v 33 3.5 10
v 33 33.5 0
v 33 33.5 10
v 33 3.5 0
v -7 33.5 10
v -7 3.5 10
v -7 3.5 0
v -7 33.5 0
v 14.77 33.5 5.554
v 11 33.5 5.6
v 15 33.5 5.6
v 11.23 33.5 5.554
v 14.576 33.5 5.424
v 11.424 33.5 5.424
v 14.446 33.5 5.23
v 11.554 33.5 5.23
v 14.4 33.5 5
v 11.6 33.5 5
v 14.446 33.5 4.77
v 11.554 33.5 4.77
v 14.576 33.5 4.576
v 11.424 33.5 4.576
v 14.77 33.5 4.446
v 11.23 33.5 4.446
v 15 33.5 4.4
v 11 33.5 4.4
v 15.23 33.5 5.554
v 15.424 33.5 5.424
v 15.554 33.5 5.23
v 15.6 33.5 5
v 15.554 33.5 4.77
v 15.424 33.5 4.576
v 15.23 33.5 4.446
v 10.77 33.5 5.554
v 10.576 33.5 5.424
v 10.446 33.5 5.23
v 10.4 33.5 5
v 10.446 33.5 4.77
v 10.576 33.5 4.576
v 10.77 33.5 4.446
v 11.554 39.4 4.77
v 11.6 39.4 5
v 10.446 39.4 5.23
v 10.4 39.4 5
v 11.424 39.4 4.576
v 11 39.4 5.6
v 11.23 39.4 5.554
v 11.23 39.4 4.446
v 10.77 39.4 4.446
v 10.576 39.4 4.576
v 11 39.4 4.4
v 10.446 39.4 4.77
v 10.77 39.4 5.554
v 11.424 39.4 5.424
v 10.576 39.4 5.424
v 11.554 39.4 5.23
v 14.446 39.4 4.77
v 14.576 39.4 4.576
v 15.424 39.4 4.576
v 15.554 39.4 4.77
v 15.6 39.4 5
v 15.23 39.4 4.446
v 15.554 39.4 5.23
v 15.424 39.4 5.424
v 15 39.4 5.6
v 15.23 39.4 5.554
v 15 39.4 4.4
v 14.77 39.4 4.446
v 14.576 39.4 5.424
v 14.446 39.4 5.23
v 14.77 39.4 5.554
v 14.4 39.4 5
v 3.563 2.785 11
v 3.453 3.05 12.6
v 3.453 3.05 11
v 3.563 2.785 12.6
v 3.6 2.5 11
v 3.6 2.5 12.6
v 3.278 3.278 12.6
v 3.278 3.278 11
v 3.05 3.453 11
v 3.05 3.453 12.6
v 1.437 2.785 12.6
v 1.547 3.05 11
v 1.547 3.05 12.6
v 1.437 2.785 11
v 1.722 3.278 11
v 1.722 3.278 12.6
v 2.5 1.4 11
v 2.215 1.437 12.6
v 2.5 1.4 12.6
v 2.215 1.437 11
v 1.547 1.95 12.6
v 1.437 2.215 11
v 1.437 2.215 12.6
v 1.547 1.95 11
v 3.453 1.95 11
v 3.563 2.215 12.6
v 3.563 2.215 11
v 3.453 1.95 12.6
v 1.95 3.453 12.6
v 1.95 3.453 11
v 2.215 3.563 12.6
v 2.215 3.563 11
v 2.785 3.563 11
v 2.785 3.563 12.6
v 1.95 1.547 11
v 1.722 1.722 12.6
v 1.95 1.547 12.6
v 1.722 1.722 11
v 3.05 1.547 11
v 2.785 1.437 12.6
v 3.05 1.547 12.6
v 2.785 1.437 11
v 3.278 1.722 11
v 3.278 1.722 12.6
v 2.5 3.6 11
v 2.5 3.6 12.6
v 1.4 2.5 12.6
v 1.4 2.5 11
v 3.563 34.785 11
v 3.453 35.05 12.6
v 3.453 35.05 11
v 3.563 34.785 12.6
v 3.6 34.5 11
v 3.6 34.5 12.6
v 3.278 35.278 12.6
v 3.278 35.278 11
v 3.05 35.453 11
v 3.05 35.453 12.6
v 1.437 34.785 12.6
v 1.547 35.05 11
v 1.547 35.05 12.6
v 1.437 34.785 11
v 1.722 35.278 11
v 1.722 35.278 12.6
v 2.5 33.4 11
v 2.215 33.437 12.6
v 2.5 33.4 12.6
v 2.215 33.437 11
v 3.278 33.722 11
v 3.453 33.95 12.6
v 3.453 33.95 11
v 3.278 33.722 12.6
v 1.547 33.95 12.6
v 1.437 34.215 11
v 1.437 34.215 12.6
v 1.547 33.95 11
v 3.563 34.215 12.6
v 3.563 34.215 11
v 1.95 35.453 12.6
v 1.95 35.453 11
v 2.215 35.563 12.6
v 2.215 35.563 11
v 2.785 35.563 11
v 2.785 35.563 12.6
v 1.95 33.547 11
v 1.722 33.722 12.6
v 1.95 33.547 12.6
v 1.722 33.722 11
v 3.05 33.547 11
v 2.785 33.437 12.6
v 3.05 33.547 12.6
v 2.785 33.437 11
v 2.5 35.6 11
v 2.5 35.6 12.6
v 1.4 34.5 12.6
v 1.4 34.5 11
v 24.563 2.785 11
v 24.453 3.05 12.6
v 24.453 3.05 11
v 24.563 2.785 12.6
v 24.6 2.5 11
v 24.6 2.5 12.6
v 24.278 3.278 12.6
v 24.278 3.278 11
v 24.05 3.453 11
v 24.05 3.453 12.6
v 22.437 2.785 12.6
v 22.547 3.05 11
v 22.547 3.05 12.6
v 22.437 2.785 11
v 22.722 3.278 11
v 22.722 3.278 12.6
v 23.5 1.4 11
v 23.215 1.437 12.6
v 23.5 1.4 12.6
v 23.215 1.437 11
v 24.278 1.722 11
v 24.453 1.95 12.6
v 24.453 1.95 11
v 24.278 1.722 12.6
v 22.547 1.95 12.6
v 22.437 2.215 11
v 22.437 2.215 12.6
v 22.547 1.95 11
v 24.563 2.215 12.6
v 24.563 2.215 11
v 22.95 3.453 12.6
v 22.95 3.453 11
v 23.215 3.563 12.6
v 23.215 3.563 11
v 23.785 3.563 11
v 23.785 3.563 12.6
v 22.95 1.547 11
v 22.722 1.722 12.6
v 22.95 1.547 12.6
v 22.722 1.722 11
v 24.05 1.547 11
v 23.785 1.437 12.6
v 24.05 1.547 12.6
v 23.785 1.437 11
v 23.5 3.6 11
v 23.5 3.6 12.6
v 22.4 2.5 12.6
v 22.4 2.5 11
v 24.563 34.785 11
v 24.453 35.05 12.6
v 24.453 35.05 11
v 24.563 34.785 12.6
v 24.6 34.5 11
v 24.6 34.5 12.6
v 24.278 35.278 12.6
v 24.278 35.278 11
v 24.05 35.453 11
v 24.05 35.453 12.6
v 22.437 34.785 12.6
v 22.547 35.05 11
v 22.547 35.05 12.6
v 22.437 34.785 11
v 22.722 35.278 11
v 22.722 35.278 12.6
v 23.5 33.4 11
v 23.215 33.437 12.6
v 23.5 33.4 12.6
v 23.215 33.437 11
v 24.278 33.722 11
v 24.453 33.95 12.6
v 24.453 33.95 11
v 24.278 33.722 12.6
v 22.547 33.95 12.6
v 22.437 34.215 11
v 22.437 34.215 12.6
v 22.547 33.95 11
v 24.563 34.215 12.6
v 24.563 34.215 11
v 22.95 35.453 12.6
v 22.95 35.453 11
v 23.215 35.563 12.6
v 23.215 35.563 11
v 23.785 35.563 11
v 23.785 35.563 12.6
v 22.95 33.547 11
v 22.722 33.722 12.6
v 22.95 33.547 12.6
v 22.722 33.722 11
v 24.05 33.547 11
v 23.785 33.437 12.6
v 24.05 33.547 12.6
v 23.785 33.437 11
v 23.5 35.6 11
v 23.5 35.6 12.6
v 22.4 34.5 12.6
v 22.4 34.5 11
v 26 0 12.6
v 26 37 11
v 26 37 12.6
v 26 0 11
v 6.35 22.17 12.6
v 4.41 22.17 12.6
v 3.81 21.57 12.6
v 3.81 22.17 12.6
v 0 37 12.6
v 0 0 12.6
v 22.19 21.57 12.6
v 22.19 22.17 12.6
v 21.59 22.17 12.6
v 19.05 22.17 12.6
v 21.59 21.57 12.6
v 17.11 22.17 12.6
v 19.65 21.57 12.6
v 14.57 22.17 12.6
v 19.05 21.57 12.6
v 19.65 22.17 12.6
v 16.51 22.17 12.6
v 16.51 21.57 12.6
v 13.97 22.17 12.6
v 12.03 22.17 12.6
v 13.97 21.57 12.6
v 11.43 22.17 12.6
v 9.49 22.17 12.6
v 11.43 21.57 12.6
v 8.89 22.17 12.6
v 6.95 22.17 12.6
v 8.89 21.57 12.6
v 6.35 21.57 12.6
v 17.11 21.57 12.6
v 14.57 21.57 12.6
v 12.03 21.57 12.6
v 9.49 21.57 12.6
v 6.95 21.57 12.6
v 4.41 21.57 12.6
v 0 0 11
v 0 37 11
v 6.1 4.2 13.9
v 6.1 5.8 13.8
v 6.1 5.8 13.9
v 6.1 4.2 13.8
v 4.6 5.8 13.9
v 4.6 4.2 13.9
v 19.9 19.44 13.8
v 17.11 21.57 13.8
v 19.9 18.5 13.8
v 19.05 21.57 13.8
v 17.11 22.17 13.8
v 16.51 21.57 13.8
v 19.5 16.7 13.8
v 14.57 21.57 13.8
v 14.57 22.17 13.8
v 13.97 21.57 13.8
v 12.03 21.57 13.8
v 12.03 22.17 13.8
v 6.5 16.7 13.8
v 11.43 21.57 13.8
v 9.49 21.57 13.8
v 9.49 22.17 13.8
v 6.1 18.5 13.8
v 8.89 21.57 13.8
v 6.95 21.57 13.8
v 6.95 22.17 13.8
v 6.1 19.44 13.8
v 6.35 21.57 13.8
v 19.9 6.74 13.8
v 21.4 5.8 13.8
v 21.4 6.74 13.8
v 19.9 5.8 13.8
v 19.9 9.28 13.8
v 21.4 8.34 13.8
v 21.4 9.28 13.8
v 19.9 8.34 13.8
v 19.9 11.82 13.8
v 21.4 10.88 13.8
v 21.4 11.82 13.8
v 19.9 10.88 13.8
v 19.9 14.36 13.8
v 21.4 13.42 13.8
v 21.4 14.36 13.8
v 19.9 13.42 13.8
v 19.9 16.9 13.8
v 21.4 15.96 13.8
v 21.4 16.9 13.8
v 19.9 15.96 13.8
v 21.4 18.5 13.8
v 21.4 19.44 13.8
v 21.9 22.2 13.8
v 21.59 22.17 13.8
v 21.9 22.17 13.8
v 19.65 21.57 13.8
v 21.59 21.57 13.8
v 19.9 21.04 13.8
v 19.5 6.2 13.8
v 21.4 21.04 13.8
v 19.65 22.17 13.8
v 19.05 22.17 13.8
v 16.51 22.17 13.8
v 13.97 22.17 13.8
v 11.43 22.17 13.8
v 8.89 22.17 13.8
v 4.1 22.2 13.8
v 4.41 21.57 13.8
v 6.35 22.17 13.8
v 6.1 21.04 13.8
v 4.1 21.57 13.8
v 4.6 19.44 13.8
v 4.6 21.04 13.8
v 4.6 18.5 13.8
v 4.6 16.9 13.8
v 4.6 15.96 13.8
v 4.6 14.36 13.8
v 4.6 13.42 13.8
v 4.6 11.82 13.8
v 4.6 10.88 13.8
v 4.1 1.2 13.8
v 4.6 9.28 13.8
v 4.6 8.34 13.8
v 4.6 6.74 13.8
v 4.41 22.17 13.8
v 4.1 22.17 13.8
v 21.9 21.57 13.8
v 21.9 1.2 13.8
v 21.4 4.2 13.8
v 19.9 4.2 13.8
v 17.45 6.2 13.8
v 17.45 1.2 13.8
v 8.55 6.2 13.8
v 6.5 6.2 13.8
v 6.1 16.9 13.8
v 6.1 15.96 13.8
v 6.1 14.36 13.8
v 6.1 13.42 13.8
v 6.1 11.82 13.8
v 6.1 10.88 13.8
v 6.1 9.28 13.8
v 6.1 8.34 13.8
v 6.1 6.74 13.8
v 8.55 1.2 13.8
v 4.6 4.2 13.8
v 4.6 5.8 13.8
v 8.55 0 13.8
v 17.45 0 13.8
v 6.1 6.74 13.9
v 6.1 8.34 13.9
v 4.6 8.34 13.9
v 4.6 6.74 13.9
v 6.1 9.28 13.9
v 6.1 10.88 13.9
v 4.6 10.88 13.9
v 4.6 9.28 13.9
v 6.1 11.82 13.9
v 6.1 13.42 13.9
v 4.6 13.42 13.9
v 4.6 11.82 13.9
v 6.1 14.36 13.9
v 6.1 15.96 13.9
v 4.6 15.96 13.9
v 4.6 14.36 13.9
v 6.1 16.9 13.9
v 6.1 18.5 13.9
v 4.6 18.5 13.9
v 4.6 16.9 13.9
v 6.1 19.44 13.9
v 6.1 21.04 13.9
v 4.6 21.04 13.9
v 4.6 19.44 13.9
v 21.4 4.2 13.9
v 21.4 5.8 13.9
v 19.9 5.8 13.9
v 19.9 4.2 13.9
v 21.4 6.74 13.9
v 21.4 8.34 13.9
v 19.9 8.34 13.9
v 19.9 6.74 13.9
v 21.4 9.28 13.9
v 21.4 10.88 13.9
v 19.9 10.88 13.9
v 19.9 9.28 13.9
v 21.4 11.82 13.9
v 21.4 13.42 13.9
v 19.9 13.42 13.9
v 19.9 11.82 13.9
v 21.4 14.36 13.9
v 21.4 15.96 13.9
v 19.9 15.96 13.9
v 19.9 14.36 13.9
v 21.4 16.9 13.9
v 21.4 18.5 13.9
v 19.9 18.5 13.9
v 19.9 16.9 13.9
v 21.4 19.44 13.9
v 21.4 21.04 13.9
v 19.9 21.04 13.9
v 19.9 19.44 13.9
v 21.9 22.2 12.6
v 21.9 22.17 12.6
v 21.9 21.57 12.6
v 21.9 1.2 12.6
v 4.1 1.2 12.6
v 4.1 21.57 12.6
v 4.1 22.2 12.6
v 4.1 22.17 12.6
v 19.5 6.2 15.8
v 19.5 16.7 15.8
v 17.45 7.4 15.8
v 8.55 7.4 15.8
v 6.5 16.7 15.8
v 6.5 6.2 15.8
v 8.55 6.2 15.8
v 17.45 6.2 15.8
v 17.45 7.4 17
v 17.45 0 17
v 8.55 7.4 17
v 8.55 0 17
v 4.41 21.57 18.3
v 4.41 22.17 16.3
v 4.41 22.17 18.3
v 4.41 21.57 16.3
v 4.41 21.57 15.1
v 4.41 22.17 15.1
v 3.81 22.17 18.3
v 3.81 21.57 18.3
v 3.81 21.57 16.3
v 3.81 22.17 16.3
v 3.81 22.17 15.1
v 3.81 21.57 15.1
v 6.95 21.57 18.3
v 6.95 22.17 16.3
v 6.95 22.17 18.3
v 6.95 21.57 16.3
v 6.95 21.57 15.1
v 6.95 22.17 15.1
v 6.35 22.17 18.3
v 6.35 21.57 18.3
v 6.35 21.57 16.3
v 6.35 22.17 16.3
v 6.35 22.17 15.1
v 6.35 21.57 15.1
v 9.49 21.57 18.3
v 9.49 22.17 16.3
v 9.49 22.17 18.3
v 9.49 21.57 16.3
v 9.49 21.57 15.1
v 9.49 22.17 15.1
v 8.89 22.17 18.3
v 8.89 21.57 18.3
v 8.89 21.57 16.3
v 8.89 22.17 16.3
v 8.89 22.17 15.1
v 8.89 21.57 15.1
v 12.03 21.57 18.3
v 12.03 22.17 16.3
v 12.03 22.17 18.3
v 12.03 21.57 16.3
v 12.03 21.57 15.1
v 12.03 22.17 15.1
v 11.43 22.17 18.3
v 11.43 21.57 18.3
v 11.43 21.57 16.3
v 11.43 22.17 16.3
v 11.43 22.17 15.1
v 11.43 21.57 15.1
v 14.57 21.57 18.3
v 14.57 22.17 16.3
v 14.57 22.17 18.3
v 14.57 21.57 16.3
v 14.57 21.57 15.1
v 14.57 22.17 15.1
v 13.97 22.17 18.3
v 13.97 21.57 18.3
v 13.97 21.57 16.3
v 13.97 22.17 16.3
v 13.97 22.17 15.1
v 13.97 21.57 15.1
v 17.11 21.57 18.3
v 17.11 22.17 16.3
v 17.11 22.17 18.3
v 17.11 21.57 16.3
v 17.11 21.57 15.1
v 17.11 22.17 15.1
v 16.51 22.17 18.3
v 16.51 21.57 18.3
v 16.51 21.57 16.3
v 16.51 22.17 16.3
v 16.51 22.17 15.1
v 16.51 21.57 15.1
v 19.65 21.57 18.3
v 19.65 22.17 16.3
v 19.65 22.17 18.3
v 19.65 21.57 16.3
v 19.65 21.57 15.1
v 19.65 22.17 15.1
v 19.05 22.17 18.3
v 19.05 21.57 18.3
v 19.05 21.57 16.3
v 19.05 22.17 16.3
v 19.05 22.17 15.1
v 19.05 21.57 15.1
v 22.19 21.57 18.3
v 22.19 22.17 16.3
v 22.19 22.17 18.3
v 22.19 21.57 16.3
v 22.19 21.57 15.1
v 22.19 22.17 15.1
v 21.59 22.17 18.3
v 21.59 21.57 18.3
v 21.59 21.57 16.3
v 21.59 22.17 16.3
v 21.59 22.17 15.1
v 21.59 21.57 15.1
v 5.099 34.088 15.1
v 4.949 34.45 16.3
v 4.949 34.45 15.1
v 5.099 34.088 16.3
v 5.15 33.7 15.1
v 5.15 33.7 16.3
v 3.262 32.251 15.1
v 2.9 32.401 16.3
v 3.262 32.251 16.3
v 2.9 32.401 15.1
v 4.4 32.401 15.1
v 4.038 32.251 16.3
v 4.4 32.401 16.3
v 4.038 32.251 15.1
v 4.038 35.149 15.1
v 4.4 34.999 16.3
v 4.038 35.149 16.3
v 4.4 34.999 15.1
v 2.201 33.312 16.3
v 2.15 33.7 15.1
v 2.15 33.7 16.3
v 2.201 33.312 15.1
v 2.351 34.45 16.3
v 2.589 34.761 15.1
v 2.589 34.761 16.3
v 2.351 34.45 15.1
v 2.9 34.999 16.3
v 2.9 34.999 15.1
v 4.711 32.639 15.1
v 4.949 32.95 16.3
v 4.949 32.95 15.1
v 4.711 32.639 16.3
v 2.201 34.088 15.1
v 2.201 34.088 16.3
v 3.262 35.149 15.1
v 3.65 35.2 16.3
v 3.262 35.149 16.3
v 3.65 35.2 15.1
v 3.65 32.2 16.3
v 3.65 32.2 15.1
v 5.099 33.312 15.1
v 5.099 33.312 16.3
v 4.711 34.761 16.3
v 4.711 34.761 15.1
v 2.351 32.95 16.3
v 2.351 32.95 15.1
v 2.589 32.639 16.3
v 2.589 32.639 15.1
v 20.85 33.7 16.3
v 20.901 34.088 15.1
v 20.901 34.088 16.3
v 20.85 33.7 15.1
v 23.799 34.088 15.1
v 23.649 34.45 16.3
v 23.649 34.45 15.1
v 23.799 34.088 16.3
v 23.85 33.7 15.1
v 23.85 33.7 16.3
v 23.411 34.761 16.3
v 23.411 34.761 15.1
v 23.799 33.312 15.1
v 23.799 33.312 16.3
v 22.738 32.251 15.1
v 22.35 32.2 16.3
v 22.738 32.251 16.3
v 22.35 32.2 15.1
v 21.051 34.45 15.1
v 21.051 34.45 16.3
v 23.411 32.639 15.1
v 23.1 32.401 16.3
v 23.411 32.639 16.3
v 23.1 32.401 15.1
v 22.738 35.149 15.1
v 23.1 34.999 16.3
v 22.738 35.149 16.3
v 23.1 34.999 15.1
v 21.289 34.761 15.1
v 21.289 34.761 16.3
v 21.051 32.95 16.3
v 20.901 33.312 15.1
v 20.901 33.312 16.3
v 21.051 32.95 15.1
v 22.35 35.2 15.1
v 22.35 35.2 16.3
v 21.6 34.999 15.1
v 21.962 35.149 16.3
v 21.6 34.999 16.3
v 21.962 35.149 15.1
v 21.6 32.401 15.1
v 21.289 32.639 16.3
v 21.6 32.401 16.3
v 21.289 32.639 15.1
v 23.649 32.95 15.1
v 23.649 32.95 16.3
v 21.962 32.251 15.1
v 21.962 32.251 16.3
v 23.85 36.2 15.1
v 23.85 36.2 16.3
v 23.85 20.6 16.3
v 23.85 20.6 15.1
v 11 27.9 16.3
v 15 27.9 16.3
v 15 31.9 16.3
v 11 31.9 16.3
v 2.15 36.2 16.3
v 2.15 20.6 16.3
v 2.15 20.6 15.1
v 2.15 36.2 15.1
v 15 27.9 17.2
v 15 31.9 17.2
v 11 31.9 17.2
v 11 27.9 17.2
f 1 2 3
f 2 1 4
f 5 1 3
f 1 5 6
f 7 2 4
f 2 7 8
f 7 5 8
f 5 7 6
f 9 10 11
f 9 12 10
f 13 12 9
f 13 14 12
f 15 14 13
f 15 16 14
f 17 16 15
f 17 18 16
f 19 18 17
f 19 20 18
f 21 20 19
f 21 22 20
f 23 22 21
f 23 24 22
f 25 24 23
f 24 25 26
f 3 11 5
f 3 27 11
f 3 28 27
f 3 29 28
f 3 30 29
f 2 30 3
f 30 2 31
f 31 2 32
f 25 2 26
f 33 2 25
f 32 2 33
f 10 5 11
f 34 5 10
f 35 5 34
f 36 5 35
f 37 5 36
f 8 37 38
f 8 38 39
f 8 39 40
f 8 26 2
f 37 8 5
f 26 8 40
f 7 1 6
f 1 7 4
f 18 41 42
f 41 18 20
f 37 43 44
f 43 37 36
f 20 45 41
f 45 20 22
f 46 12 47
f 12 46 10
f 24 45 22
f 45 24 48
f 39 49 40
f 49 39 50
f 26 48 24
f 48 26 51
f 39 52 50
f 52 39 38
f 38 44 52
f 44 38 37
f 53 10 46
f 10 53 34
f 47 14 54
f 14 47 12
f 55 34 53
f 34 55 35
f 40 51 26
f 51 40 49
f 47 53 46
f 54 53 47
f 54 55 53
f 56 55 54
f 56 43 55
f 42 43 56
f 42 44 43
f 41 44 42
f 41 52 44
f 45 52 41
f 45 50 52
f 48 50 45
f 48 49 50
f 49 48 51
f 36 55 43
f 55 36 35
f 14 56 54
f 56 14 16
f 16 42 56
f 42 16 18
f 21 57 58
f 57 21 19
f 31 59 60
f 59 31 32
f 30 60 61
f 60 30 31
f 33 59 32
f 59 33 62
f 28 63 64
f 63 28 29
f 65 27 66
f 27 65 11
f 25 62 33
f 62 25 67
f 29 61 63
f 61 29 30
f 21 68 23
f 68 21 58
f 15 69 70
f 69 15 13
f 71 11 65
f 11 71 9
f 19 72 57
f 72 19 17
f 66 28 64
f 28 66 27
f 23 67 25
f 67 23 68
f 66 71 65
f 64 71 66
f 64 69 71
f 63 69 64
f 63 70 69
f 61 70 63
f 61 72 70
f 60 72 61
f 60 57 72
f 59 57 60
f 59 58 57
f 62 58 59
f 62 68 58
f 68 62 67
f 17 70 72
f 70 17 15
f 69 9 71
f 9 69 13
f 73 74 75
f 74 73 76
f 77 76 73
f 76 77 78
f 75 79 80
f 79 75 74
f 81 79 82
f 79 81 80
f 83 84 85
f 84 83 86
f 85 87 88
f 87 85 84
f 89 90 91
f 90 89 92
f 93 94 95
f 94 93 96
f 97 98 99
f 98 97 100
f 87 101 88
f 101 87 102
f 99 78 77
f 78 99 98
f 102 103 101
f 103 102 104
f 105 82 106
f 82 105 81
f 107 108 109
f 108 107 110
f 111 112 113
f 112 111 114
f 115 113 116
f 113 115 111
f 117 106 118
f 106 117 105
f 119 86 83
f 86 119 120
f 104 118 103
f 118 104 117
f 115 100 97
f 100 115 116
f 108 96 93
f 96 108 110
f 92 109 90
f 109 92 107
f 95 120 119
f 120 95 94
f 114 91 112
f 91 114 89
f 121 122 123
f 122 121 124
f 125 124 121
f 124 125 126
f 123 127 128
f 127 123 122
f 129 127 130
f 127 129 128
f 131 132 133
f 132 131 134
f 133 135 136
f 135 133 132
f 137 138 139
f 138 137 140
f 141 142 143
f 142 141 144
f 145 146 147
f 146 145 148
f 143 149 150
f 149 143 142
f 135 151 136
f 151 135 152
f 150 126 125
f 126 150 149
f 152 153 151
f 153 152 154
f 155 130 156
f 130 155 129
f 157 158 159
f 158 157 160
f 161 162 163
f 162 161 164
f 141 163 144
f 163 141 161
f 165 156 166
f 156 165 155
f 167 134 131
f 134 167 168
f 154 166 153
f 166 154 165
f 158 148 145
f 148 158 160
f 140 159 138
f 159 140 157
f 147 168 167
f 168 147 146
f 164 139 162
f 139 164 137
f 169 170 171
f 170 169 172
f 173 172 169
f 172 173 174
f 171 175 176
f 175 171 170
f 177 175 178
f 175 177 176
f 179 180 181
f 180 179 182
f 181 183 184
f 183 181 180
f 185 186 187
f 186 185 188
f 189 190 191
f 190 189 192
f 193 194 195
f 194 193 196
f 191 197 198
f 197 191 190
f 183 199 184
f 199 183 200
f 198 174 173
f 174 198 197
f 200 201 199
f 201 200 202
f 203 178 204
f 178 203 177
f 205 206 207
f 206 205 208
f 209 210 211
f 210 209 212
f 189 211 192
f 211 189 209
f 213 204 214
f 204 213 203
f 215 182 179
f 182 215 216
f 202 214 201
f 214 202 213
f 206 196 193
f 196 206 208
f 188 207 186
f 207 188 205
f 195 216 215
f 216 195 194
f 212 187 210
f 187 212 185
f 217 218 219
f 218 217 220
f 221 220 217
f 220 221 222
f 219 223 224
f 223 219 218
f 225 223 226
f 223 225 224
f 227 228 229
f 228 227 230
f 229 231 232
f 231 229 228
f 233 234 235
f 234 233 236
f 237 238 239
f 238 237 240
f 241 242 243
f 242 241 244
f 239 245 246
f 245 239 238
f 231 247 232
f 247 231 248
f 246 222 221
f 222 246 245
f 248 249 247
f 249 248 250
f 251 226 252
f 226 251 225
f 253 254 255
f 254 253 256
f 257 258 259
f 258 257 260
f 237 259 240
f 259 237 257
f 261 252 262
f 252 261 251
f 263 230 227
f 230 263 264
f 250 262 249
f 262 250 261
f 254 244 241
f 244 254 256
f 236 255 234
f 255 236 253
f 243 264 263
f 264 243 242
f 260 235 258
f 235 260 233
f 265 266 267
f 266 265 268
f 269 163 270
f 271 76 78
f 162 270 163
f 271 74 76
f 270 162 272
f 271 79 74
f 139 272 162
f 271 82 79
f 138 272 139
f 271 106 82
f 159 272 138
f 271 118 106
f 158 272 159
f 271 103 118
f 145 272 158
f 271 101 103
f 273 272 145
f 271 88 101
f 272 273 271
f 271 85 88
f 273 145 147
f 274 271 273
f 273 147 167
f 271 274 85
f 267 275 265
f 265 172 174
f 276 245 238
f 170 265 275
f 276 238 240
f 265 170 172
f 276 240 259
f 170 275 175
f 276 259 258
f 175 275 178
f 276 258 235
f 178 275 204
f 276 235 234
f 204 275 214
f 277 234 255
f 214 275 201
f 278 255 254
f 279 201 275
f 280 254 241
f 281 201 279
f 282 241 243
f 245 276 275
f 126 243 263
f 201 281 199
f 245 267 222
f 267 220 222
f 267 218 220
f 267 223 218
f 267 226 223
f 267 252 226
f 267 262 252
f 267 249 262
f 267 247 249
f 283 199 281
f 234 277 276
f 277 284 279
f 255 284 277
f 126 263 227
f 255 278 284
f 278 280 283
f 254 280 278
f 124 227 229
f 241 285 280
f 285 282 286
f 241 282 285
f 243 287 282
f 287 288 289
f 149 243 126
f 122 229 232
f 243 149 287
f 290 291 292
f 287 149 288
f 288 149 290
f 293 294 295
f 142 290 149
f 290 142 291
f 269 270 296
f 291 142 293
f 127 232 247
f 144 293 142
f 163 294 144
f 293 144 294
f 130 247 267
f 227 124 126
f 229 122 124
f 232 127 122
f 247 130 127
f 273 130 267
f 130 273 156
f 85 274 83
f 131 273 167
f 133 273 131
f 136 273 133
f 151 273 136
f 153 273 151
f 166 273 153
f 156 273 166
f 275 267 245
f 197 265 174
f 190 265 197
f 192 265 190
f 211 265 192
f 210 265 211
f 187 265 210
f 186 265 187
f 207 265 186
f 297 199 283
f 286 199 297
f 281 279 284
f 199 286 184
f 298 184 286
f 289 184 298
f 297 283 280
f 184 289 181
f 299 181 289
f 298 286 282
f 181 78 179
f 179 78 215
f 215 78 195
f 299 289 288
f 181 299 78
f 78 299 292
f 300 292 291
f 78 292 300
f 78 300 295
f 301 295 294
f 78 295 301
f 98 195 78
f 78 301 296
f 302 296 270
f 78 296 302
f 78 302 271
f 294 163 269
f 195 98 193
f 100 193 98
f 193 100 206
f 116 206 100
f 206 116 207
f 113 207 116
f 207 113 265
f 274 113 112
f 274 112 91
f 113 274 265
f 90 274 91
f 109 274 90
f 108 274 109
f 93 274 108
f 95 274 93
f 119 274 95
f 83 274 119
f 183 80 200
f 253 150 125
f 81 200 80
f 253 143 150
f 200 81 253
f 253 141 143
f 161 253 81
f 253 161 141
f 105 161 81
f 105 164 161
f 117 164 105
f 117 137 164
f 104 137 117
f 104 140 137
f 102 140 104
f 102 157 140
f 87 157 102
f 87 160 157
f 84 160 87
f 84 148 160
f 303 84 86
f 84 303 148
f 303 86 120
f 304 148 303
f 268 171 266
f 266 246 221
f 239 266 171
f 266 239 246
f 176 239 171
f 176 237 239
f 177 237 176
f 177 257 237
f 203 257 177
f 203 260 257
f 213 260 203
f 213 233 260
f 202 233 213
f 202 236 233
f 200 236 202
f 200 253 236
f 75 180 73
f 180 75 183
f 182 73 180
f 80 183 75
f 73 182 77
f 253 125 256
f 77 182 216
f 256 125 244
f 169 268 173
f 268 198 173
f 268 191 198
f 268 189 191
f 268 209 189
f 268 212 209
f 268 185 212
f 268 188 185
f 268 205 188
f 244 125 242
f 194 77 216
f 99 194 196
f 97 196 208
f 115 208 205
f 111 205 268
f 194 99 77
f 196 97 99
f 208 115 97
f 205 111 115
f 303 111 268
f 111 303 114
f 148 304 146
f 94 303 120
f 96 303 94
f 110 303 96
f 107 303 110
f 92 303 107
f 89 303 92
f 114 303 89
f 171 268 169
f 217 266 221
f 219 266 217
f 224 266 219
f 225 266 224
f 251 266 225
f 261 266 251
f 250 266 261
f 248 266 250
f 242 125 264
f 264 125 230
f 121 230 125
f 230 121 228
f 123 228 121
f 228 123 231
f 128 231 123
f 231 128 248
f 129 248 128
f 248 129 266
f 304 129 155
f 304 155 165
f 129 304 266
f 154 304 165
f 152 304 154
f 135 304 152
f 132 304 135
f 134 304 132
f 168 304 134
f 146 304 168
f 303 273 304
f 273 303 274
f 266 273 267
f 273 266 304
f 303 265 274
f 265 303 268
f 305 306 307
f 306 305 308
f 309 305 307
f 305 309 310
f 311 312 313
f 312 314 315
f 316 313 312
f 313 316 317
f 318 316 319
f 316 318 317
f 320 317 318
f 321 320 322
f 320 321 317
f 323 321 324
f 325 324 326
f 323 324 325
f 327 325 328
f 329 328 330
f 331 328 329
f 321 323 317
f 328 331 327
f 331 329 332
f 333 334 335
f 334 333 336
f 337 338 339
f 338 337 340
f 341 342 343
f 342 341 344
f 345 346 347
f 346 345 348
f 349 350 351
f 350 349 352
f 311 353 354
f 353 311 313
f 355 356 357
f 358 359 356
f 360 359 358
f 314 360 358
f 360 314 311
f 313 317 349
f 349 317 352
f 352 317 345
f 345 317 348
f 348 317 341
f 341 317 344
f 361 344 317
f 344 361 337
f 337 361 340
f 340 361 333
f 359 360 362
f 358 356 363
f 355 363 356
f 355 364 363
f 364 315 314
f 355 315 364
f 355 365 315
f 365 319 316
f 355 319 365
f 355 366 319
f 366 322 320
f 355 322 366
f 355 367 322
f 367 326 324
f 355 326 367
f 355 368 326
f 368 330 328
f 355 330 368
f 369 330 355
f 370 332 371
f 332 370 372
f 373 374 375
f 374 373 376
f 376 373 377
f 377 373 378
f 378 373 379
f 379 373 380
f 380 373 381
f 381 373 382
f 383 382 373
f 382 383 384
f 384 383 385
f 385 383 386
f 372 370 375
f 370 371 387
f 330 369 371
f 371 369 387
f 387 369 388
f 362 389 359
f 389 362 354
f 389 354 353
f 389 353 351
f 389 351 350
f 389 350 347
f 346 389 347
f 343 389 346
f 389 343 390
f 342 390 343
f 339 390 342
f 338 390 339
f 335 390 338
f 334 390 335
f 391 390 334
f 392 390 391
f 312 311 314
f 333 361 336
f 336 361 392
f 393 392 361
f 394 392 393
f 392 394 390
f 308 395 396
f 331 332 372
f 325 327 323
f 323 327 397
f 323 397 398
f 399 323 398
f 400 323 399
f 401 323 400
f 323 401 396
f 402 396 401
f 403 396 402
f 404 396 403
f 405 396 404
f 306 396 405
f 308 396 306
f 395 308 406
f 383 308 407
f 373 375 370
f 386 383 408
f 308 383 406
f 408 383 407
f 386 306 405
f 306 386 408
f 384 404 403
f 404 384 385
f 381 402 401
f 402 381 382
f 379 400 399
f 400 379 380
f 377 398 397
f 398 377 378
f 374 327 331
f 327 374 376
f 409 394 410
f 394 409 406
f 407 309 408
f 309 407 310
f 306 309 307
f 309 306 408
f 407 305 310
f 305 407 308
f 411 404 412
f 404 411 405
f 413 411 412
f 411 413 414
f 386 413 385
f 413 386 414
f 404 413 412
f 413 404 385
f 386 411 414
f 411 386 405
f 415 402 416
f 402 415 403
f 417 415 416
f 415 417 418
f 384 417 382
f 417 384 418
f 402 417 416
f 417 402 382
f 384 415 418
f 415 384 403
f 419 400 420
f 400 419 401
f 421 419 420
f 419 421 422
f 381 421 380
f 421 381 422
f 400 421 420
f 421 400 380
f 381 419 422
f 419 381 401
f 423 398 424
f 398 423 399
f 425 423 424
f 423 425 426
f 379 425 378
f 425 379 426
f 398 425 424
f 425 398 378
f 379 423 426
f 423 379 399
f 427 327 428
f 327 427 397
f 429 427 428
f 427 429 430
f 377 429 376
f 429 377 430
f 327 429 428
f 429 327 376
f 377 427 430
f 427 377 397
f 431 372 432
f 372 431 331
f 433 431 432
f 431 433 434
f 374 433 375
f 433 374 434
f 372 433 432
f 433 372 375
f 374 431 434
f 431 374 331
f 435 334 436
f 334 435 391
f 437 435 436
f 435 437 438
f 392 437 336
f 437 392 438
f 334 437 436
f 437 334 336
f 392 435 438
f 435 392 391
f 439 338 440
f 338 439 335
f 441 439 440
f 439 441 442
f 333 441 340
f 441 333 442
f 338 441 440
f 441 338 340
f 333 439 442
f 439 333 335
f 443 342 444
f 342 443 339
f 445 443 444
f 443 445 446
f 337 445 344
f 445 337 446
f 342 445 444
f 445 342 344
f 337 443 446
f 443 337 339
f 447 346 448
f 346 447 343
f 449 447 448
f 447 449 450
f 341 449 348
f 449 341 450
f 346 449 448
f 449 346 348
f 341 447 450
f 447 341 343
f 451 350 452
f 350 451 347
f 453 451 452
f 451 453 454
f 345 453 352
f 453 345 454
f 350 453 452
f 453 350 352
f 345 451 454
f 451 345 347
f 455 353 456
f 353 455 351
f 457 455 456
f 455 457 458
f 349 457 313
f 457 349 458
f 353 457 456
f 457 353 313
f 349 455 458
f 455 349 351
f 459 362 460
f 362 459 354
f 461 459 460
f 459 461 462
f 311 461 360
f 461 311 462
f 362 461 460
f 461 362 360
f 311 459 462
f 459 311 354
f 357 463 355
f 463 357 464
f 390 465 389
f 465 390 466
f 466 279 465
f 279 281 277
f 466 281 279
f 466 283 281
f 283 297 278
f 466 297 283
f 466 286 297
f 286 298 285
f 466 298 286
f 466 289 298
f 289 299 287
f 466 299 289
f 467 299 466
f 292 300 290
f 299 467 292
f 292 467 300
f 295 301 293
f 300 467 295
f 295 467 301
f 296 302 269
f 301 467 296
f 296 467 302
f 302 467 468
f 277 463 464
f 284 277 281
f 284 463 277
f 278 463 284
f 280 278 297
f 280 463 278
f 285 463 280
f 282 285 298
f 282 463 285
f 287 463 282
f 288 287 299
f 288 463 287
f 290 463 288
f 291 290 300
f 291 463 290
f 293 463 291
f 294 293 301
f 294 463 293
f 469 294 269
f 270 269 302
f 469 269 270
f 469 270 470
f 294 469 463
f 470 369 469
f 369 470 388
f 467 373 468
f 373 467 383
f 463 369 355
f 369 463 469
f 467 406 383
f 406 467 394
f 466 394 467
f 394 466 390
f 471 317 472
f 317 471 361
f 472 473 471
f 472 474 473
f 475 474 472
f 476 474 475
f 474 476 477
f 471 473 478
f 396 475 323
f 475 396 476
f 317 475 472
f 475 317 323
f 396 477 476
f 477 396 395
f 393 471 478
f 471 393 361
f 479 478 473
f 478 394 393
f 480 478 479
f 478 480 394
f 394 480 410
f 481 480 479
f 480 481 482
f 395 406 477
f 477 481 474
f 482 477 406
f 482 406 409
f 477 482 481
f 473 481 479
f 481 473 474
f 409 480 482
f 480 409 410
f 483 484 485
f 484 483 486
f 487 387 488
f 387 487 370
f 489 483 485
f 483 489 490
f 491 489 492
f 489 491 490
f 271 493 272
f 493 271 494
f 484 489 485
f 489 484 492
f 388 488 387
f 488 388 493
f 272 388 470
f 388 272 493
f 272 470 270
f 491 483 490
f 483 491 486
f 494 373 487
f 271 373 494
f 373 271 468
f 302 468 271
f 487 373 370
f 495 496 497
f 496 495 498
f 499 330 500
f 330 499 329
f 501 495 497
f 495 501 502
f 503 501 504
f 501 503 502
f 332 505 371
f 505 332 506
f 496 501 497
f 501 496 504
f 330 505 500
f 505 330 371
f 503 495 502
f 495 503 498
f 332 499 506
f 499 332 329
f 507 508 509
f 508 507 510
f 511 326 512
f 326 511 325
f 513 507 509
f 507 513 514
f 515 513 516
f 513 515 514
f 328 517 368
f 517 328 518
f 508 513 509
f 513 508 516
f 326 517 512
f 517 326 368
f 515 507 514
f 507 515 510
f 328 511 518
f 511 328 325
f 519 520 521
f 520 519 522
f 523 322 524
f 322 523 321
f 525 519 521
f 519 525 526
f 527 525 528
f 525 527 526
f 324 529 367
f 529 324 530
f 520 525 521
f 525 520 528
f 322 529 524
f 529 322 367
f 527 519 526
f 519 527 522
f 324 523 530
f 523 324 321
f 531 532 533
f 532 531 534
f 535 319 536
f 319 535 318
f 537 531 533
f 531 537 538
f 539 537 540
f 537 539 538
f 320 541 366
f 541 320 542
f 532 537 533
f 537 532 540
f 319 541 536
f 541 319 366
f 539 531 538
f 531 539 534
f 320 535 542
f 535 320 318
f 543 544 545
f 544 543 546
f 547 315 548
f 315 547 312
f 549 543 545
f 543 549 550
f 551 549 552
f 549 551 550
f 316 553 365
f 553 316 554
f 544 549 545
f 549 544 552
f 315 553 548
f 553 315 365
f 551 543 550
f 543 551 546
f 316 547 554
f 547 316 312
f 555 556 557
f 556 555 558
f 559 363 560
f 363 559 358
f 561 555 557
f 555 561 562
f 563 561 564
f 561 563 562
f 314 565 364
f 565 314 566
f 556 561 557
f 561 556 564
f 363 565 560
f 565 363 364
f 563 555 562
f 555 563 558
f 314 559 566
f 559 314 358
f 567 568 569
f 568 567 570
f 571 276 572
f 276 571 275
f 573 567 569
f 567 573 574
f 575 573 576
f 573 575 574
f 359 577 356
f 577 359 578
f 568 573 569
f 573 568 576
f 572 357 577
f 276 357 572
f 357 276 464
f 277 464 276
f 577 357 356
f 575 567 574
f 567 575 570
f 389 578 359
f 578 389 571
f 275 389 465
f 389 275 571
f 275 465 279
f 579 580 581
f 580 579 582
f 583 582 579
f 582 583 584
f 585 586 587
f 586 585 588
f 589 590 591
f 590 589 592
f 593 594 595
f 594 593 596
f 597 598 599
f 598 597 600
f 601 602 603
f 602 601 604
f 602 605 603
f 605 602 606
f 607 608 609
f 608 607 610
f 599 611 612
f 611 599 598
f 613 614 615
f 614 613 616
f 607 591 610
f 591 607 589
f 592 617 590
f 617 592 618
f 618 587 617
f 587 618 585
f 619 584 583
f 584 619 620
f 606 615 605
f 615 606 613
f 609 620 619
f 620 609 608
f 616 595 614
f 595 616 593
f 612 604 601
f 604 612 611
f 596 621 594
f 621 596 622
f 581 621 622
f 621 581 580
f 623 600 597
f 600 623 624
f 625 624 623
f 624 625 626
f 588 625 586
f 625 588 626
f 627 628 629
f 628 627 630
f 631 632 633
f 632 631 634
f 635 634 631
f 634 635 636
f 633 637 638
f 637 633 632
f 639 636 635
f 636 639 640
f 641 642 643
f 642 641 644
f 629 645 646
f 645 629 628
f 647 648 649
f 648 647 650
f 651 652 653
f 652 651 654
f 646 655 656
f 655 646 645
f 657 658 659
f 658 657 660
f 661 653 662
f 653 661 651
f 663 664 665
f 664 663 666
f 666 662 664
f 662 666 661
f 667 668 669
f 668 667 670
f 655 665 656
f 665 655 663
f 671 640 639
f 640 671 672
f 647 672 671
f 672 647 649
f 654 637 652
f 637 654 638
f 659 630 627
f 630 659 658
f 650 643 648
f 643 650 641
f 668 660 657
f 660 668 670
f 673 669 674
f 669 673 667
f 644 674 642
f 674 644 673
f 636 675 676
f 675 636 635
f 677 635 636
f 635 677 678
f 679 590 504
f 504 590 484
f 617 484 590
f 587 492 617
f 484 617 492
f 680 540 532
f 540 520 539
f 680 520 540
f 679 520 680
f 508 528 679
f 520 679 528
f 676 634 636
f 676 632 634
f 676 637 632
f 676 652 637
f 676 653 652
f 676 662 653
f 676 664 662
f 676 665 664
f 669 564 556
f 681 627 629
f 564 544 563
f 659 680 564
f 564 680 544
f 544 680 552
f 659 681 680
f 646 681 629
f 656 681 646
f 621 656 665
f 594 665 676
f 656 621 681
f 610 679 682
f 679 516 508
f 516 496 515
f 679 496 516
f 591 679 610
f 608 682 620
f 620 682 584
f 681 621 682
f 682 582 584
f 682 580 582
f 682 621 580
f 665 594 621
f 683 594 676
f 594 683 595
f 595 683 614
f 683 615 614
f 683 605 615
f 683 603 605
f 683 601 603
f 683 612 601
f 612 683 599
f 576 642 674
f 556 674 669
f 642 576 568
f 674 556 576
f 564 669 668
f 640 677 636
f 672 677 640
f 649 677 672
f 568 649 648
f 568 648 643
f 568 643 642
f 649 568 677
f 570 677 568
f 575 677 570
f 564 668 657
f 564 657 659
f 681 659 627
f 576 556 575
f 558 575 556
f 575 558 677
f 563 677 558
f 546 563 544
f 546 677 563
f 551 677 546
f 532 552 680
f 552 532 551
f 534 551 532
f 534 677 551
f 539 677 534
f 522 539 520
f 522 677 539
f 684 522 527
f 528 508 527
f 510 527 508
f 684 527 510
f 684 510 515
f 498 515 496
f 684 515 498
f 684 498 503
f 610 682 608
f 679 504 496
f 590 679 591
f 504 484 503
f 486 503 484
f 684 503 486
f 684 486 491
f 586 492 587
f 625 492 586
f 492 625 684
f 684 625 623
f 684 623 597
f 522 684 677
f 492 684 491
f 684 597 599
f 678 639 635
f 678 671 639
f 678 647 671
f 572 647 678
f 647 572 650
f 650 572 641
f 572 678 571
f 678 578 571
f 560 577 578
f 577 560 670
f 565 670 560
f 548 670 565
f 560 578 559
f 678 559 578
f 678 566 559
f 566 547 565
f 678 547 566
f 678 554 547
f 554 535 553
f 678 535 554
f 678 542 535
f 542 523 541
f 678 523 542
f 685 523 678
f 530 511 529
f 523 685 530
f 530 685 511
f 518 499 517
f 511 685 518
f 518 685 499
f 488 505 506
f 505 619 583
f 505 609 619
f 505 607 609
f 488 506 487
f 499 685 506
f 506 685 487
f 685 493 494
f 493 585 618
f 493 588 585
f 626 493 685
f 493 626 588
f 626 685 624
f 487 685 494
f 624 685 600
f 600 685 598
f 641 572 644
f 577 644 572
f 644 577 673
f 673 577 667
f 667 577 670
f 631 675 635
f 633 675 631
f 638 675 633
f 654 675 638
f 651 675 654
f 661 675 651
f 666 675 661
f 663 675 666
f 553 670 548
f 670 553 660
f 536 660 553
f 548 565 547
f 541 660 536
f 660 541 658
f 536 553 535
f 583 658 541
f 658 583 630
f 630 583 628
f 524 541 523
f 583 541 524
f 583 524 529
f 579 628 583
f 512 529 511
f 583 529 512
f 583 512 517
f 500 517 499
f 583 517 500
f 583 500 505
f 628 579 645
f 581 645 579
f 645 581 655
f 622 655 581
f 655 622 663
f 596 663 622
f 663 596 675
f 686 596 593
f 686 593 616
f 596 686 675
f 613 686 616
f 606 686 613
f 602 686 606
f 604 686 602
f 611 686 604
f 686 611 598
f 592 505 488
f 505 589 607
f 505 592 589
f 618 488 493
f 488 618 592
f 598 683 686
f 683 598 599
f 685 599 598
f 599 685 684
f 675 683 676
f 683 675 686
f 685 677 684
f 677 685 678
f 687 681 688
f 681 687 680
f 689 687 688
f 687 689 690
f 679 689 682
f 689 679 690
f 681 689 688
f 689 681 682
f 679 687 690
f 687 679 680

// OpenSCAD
// ============================================================
// VBT Tracker — assemblage 3D (unités : mm)
// Ouvrir avec OpenSCAD (gratuit) : F5 aperçu, F6 rendu, F7 export STL
// Mettre explode = 15 pour une vue éclatée.
// ============================================================

explode = 0;        // écartement vertical entre les étages (mm)

// ---------- dimensions ----------
pcb  = [26, 37, 1.6];      // PCB principal (JLCPCB W1033614AS4FR7)
bat  = [40, 30, 10];       // batterie LiPo
xiao = [17.8, 21, 1.2];    // carte XIAO ESP32-S3 (PCB nu)
gy   = [21.7, 15.6, 1.2];  // module GY-521 (MPU6050)

foam     = 1;     // adhésif double face entre batterie et PCB
gy_stand = 2.5;   // surélévation du GY-521 (plastique du header)
hole_d   = 2.2;   // trous de fixation M2 du PCB principal
hole_off = 2.5;   // distance des trous aux bords

// ---------- étages ----------
pcb_z = bat[2] + foam + explode;        // dessous du PCB
top_z = pcb_z + pcb[2] + explode;       // dessus du PCB

// ============================================================
// Pièces
// ============================================================
module battery() {
  color("LightSlateGray") cube(bat);
  color("Red")   translate([bat[0]/2 - 2, bat[1] - 0.1, bat[2]/2])
    rotate([-90, 0, 0]) cylinder(d = 1.2, h = 6, $fn = 16);
  color("Black") translate([bat[0]/2 + 2, bat[1] - 0.1, bat[2]/2])
    rotate([-90, 0, 0]) cylinder(d = 1.2, h = 6, $fn = 16);
}

module main_pcb() {
  color("DarkGreen") difference() {
    cube(pcb);
    for (x = [hole_off, pcb[0] - hole_off], y = [hole_off, pcb[1] - hole_off])
      translate([x, y, -1]) cylinder(d = hole_d, h = pcb[2] + 2, $fn = 24);
  }
}

module xiao() {
  color([0.12, 0.12, 0.12]) cube(xiao);
  // blindage RF
  color("Silver") translate([(xiao[0] - 13) / 2, 5, xiao[2]])
    cube([13, 10.5, 2]);
  // connecteur USB-C, affleurant au bord avant
  color("Silver") translate([(xiao[0] - 8.9) / 2, -1.2, xiao[2]])
    cube([8.9, 7.4, 3.2]);
  // pastilles latérales
  color("Gold") for (s = [0, 1], i = [0 : 6])
    translate([s ? xiao[0] - 2 : 0.5, 3 + i * 2.54, xiao[2]])
      cube([1.5, 1.6, 0.1]);
}

module gy521() {
  // broches du header, traversent vers le PCB principal
  color("Gold") for (i = [0 : 7])
    translate([(gy[0] - 17.78) / 2 + i * 2.54 - 0.3, 1.27 - 0.3, -gy_stand - pcb[2]])
      cube([0.6, 0.6, gy_stand + pcb[2] + gy[2] + 2]);
  color("RoyalBlue") difference() {
    cube(gy);
    for (x = [1.5, gy[0] - 1.5])  // trous de fixation du module
      translate([x, gy[1] - 2.5, -1]) cylinder(d = 3, h = gy[2] + 2, $fn = 24);
  }
  // puce MPU6050
  color([0.12, 0.12, 0.12]) translate([(gy[0] - 4) / 2, (gy[1] - 4) / 2 + 1.5, gy[2]])
    cube([4, 4, 0.9]);
}

// ============================================================
// Assemblage (origine = coin du PCB principal)
// ============================================================
translate([(pcb[0] - bat[0]) / 2, (pcb[1] - bat[1]) / 2, 0]) battery();
translate([0, 0, pcb_z]) main_pcb();
// XIAO : USB-C vers le bord avant (y = 0) pour la recharge
translate([(pcb[0] - xiao[0]) / 2, 1.2, top_z]) xiao();
// GY-521 : surélevé sur son header, vers le bord arrière
translate([(pcb[0] - gy[0]) / 2, pcb[1] - gy[1] - 0.8, top_z + gy_stand]) gy521();

// ---------- encombrement ----------
total_h = bat[2] + foam + pcb[2] + gy_stand + gy[2] + 0.9;
echo(str("Encombrement total : ", bat[0], " x ", bat[1] + 6, " x ", total_h,
         " mm (L x l x H, fils de batterie inclus)"));
